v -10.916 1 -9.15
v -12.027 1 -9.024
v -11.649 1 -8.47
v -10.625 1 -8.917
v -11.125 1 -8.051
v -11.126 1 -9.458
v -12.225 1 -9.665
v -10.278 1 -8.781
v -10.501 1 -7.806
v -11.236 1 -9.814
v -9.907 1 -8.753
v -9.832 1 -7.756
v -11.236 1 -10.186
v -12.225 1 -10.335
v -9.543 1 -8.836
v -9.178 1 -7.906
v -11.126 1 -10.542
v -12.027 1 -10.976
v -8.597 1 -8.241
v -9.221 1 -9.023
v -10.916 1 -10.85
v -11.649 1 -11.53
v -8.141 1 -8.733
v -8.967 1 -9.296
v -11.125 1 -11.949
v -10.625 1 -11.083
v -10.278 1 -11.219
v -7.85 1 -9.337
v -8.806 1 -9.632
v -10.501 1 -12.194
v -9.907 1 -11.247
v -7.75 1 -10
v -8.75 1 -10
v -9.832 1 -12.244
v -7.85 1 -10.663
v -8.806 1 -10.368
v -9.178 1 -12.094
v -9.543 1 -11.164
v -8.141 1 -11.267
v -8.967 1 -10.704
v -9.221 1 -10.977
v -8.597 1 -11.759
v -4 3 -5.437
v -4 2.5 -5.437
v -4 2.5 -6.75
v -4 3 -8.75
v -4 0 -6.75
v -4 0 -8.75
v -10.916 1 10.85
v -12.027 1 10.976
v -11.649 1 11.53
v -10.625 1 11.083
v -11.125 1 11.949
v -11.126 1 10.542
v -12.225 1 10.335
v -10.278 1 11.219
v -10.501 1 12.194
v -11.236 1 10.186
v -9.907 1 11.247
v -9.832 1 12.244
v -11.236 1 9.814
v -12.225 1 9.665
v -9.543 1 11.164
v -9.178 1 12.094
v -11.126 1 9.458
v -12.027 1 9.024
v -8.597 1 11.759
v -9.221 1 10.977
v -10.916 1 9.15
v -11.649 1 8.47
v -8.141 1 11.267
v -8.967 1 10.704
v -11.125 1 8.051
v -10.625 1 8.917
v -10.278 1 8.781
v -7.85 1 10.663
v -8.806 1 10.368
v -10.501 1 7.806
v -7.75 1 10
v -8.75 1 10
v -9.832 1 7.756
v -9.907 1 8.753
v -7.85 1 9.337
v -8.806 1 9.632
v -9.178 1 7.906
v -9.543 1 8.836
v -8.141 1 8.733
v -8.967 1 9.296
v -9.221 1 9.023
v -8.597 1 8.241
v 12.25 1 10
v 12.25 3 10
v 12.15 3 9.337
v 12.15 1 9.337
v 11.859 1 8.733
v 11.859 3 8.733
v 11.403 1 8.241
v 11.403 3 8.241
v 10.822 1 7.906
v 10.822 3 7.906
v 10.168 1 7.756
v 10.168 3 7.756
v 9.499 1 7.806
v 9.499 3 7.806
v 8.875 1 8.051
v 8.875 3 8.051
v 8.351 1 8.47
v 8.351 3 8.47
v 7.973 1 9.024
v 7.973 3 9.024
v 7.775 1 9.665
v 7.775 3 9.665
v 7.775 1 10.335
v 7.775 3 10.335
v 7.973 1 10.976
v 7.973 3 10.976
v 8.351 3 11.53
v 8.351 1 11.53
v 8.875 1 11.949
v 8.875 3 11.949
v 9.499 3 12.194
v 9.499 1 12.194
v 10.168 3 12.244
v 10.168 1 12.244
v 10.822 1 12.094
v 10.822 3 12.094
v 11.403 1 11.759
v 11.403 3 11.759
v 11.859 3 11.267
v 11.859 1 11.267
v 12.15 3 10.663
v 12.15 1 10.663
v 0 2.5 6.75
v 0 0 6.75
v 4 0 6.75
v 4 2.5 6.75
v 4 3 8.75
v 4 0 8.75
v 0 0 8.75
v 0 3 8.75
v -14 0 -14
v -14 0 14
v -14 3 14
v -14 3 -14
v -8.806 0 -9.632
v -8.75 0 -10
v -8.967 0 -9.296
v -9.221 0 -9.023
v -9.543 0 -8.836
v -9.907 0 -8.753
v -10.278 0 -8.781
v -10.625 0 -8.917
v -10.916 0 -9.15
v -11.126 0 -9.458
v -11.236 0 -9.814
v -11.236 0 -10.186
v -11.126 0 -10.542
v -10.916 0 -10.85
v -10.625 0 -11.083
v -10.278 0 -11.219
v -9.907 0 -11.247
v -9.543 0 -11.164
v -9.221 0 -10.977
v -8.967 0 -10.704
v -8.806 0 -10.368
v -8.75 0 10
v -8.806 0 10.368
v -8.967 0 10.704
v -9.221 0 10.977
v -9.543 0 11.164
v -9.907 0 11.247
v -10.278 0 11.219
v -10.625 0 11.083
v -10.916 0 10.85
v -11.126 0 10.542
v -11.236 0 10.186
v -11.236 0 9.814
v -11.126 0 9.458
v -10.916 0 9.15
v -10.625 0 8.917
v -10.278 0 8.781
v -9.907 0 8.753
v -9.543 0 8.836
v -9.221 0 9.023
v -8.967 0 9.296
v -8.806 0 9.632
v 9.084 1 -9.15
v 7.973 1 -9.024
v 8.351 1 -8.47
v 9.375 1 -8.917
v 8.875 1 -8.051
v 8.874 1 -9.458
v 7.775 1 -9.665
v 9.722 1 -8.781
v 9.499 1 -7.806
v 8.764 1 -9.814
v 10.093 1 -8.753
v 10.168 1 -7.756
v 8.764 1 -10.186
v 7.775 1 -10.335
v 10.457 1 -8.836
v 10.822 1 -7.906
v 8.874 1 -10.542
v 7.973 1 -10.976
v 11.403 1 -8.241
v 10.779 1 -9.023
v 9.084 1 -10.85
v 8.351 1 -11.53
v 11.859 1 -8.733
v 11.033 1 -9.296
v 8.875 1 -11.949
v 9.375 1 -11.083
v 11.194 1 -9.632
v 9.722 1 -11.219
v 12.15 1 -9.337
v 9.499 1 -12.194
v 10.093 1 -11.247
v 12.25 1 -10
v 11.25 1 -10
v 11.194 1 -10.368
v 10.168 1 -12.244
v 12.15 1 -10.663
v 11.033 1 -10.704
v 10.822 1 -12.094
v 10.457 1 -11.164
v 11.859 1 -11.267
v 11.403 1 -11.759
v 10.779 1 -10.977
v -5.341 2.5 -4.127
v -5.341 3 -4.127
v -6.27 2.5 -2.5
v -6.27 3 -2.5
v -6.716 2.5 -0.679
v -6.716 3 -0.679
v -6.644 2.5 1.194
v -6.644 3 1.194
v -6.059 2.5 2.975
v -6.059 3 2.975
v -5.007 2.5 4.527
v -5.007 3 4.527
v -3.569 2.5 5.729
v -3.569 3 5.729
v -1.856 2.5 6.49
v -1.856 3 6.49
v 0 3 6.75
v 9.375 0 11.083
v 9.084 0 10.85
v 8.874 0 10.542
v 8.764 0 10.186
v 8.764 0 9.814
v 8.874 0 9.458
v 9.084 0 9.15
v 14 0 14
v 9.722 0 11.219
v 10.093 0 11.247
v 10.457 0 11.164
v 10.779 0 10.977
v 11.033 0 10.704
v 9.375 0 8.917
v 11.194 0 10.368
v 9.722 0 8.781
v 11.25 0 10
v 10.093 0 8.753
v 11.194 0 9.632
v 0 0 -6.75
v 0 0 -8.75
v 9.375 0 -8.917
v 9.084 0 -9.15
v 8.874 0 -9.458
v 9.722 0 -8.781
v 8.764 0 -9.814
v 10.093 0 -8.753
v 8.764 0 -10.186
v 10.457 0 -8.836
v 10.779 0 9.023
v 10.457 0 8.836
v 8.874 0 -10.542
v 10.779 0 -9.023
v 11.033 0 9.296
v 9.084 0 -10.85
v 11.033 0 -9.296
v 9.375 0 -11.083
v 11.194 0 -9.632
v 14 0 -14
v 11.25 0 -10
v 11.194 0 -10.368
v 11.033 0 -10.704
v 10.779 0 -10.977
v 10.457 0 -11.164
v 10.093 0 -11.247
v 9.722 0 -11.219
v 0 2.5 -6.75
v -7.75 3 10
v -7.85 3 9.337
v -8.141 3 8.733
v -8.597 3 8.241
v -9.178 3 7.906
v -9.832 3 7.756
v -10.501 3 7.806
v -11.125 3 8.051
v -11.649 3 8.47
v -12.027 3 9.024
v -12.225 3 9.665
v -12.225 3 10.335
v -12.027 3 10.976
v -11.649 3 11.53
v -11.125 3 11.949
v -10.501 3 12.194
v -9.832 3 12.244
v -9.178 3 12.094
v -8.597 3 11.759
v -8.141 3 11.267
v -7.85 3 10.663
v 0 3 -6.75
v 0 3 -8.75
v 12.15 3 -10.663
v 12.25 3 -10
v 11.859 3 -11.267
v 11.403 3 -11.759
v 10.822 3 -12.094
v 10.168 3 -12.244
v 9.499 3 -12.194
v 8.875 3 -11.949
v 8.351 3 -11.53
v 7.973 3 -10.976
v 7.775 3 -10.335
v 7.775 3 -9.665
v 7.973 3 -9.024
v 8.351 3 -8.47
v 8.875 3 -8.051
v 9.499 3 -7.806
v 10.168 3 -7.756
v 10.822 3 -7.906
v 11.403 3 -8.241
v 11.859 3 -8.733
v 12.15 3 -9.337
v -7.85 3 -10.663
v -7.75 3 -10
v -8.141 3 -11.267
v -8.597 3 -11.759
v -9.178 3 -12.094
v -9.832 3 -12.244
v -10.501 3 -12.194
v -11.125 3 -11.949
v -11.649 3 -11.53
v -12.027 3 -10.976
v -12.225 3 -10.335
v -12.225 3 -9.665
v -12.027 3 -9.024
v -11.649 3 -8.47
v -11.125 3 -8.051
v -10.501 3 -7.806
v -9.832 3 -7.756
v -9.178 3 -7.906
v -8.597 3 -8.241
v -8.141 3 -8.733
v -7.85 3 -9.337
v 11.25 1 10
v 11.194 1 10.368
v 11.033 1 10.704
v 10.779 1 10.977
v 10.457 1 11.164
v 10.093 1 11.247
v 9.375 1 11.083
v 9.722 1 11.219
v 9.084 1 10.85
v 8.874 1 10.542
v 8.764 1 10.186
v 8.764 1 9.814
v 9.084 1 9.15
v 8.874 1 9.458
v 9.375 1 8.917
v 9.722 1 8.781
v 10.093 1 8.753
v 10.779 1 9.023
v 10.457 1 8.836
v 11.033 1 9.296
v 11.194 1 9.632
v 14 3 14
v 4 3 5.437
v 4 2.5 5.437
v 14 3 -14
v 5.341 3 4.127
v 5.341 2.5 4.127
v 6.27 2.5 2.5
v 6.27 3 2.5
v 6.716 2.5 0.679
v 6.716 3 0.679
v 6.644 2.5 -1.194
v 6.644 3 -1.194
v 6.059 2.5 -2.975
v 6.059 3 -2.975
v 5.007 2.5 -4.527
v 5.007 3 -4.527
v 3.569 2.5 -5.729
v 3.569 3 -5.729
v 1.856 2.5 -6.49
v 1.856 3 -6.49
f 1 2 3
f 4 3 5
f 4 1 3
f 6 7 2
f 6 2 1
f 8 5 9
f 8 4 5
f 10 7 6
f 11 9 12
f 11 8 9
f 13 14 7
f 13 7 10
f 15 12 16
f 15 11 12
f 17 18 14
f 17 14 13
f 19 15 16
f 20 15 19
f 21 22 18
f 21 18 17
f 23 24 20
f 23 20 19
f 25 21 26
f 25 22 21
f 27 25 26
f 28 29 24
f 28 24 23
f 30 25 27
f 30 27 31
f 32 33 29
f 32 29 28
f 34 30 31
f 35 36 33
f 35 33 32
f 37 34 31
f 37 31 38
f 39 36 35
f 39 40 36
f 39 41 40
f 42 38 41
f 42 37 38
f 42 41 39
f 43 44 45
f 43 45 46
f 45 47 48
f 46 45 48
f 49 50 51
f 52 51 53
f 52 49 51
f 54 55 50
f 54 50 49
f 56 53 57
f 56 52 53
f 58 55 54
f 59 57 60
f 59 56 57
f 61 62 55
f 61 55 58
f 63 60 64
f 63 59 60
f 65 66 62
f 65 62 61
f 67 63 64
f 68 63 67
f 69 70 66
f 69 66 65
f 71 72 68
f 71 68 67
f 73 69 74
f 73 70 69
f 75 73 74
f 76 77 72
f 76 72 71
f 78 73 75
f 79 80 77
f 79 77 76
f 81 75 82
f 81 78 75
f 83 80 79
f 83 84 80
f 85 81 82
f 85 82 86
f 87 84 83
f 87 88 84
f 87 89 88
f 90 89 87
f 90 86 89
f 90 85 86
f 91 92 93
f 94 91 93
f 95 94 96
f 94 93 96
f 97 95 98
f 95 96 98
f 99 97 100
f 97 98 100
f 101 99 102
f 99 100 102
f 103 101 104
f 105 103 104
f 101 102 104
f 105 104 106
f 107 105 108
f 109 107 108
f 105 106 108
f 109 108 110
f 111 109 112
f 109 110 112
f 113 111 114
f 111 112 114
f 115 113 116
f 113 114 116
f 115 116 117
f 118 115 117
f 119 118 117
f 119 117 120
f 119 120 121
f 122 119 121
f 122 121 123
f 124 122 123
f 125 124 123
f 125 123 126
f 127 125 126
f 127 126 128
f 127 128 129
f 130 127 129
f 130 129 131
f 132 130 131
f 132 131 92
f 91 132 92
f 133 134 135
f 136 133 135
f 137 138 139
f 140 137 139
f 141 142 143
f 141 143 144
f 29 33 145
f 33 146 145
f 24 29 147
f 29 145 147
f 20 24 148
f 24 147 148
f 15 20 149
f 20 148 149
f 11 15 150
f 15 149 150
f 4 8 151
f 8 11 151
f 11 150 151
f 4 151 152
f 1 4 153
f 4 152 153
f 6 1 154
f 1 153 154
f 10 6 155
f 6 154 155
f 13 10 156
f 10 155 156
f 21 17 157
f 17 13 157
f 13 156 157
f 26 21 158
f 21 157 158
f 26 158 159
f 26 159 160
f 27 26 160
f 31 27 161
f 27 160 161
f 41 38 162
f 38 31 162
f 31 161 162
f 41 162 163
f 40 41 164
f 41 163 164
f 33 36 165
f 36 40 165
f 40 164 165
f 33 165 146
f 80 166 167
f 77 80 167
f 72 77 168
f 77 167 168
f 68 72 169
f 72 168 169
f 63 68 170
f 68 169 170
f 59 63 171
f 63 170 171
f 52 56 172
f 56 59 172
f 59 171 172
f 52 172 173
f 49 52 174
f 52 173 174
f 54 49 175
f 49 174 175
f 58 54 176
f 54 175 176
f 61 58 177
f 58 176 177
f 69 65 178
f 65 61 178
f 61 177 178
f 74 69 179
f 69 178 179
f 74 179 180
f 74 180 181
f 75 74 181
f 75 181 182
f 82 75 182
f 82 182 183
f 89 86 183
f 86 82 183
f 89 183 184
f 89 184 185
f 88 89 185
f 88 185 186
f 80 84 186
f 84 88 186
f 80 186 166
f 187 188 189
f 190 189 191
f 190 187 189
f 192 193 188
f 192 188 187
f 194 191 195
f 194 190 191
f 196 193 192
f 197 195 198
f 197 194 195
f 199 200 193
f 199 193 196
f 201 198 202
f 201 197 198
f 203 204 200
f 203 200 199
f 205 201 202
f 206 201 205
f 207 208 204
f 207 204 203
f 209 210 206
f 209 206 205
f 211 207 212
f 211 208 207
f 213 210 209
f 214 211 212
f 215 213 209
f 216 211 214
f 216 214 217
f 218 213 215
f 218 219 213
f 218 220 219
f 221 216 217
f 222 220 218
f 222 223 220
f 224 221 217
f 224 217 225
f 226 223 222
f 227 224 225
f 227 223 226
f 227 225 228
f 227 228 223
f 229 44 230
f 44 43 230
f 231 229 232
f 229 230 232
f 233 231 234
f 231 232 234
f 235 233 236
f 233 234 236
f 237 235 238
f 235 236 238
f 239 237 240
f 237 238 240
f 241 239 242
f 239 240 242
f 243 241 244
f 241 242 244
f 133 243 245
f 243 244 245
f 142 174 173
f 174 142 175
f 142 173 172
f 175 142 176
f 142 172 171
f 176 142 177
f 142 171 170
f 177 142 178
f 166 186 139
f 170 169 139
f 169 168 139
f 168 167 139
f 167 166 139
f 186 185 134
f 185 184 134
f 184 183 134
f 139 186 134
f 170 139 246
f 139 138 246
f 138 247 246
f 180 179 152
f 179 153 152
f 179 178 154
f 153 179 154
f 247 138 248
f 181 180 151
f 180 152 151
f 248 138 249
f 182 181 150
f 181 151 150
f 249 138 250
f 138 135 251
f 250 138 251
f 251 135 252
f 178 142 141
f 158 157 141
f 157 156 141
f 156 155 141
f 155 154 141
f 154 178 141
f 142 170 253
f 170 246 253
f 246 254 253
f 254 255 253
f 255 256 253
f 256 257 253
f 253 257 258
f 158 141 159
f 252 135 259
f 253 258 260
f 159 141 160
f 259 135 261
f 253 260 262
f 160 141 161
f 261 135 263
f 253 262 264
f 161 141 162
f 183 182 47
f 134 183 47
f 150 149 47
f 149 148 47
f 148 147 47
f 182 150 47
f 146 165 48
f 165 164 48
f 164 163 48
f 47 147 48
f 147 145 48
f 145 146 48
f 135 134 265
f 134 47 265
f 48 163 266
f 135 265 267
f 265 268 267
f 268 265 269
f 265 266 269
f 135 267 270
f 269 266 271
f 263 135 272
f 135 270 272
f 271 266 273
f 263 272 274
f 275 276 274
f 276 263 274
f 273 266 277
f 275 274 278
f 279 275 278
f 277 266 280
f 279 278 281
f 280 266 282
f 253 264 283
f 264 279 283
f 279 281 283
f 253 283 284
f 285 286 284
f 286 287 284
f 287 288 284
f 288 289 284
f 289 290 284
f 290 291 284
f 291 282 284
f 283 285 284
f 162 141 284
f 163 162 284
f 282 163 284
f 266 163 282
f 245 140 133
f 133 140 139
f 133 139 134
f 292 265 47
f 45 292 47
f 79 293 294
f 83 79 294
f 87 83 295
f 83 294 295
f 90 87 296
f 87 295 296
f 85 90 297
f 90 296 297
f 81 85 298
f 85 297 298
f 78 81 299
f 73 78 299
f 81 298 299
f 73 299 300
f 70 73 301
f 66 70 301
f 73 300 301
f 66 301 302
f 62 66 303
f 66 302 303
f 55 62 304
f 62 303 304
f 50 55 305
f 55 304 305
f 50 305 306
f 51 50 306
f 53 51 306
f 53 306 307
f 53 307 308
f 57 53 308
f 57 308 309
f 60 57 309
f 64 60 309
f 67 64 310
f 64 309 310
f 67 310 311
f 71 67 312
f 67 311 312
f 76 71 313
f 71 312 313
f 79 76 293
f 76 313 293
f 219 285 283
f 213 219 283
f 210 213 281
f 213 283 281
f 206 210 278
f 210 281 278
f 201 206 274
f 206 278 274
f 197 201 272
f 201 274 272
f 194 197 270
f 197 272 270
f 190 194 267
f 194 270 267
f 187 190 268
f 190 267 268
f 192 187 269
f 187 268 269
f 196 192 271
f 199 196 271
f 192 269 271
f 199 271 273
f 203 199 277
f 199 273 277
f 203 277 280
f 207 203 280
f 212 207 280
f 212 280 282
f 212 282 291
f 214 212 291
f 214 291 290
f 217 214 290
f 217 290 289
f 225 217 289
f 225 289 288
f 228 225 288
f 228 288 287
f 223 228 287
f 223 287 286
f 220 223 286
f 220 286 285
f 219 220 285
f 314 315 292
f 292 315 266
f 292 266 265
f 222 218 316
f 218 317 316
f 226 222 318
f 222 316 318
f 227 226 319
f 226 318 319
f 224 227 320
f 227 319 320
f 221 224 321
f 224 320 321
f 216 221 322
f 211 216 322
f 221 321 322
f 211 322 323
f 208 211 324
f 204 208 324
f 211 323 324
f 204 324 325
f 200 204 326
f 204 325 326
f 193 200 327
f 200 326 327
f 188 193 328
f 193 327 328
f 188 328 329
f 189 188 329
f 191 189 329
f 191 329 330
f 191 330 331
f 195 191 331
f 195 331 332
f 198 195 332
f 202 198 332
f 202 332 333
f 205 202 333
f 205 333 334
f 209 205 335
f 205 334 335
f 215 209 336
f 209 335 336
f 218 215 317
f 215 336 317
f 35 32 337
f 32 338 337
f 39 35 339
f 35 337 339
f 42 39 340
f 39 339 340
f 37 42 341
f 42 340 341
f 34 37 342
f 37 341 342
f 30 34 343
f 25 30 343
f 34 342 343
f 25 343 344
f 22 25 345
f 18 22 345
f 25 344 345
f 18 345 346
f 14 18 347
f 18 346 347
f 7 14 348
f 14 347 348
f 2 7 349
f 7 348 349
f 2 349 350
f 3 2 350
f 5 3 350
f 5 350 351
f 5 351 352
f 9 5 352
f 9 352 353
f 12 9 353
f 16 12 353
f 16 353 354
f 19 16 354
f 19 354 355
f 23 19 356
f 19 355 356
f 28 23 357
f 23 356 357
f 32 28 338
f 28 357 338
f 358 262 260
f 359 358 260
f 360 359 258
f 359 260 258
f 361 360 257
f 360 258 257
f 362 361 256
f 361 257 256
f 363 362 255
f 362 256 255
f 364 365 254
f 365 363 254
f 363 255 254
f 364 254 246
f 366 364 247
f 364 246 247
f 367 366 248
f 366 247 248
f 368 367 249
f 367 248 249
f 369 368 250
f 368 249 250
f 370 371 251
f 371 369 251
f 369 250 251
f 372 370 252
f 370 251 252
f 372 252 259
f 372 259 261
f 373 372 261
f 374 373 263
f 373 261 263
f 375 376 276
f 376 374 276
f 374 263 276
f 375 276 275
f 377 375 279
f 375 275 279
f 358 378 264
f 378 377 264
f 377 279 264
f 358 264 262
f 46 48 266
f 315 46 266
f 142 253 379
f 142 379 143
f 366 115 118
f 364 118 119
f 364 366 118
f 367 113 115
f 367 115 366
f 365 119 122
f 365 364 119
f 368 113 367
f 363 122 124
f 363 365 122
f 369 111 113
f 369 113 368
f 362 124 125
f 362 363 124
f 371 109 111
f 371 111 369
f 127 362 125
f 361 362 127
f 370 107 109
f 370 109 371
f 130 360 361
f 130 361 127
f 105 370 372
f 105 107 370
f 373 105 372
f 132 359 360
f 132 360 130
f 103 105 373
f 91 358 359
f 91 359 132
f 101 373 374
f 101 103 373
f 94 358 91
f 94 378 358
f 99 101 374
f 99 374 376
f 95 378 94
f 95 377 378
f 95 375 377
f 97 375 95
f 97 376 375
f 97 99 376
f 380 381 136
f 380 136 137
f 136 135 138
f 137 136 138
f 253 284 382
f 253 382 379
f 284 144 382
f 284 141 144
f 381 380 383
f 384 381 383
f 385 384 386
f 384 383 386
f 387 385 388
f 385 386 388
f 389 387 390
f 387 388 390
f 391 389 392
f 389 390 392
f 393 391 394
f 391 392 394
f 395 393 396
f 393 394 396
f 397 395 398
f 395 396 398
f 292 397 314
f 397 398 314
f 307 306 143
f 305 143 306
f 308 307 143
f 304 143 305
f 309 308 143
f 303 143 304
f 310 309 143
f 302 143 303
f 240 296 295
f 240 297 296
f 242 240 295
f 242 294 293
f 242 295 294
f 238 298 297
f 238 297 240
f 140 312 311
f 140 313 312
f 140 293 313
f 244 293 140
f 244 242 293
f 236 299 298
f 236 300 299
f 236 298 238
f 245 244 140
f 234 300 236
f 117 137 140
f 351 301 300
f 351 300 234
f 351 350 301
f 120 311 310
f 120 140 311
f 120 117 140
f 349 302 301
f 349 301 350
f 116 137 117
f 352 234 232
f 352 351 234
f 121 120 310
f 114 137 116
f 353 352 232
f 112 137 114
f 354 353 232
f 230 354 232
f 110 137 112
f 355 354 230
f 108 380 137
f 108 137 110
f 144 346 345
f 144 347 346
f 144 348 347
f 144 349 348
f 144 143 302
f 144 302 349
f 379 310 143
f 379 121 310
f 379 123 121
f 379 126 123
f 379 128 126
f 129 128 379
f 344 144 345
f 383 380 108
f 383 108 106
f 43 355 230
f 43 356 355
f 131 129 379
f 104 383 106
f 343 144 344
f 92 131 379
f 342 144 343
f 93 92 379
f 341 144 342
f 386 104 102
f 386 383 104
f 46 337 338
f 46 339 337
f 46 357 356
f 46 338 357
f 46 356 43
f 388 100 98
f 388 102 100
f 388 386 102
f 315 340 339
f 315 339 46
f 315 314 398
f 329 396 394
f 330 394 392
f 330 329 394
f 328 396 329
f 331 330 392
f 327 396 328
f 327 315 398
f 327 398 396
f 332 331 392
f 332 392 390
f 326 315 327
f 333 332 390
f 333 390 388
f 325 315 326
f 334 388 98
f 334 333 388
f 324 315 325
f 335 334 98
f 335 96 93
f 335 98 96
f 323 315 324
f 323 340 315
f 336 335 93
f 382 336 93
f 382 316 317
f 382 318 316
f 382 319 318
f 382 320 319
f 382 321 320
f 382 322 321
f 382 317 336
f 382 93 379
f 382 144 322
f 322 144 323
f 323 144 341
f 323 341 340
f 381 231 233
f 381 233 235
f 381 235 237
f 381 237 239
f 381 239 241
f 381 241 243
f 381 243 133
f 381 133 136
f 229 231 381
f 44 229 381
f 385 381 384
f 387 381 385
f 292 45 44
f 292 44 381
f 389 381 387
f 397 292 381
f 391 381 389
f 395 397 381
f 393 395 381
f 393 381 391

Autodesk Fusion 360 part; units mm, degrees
sketch "Sketch1" plane through (0, 0, 0) normal (0, 1, 0) x (1, 0, 0)
  line L0 (-14, 14) -> (14, 14)
  line L1 (14, 14) -> (14, -14)
  line L2 (14, -14) -> (-14, -14)
  line L3 (-14, -14) -> (-14, 14)
  line L4 (-14, 14) -> (14, -14) construction
  circle A0 centre (0, 0) radius 6.75
  line L5 (-4, 8.75) -> (0, 8.75)
  line L6 (0, 8.75) -> (0, 6.75)
  line L7 (0, 6.75) -> (-4, 6.75)
  line L8 (-4, 6.75) -> (-4, 8.75)
  line L9 (0, 0) -> (0, 6.75)
  line L10 (0, 0) -> (0, -6.75)
  line L11 (0, -6.75) -> (4, -6.75)
  line L12 (4, -6.75) -> (4, -8.75)
  line L13 (4, -8.75) -> (0, -8.75)
  line L14 (0, -8.75) -> (0, -6.75)
  line L15 (10, -10) -> (-10, -10) construction
  line L16 (-10, -10) -> (-10, 10) construction
  line L17 (-10, 10) -> (10, 10) construction
  line L18 (10, 10) -> (10, -10) construction
  circle A1 centre (-10, 10) radius 1.25
  circle A2 centre (10, 10) radius 1.25
  circle A3 centre (-10, -10) radius 1.25
  circle A4 centre (10, -10) radius 1.25
  line L19 (4, -6.75) -> (4, -5.4371)
  line L20 (-4, 6.75) -> (-4, 5.4371)
  circle A5 centre (-10, -10) radius 2.25
  circle A6 centre (-10, 10) radius 2.25
  circle A7 centre (10, 10) radius 2.25
  circle A8 centre (10, -10) radius 2.25
  dimension "d1" = 28
  dimension "d2" = 28
  dimension "d3" = 13.5
  dimension "d4" = 4
  dimension "d5" = 2
  dimension "d8" = 4
  dimension "d9" = 2
  dimension "d10" = 4
  dimension "d11" = 2.5
  dimension "d12" = 2.5
  dimension "d13" = 2.5
  dimension "d14" = 2.5
  dimension "d20" = 4.5
  dimension "d21" = 4.5
  dimension "d22" = 4.5
  dimension "d23" = 4.5
extrude "Extrude1" add sketch "Sketch1" along normal blind 3 contours L0 L1 L2 L3 | A0 L9 L10 | A0 L9 L10 | A0 L7 L20 | A0 L11 L19 | A5 | A6 | A7 | A8
extrude "Extrude2" cut sketch "Sketch1" against normal blind 0.5 from surface at 3 contours A0 L9 L10 | A0 L9 L10 | A0 L7 L20 | A0 L11 L19
extrude "Extrude3" cut sketch "Sketch1" against normal blind 2 from surface at 3 contours A2 | A5 | A6 | A7 | A8
equation "d1 = d2"
